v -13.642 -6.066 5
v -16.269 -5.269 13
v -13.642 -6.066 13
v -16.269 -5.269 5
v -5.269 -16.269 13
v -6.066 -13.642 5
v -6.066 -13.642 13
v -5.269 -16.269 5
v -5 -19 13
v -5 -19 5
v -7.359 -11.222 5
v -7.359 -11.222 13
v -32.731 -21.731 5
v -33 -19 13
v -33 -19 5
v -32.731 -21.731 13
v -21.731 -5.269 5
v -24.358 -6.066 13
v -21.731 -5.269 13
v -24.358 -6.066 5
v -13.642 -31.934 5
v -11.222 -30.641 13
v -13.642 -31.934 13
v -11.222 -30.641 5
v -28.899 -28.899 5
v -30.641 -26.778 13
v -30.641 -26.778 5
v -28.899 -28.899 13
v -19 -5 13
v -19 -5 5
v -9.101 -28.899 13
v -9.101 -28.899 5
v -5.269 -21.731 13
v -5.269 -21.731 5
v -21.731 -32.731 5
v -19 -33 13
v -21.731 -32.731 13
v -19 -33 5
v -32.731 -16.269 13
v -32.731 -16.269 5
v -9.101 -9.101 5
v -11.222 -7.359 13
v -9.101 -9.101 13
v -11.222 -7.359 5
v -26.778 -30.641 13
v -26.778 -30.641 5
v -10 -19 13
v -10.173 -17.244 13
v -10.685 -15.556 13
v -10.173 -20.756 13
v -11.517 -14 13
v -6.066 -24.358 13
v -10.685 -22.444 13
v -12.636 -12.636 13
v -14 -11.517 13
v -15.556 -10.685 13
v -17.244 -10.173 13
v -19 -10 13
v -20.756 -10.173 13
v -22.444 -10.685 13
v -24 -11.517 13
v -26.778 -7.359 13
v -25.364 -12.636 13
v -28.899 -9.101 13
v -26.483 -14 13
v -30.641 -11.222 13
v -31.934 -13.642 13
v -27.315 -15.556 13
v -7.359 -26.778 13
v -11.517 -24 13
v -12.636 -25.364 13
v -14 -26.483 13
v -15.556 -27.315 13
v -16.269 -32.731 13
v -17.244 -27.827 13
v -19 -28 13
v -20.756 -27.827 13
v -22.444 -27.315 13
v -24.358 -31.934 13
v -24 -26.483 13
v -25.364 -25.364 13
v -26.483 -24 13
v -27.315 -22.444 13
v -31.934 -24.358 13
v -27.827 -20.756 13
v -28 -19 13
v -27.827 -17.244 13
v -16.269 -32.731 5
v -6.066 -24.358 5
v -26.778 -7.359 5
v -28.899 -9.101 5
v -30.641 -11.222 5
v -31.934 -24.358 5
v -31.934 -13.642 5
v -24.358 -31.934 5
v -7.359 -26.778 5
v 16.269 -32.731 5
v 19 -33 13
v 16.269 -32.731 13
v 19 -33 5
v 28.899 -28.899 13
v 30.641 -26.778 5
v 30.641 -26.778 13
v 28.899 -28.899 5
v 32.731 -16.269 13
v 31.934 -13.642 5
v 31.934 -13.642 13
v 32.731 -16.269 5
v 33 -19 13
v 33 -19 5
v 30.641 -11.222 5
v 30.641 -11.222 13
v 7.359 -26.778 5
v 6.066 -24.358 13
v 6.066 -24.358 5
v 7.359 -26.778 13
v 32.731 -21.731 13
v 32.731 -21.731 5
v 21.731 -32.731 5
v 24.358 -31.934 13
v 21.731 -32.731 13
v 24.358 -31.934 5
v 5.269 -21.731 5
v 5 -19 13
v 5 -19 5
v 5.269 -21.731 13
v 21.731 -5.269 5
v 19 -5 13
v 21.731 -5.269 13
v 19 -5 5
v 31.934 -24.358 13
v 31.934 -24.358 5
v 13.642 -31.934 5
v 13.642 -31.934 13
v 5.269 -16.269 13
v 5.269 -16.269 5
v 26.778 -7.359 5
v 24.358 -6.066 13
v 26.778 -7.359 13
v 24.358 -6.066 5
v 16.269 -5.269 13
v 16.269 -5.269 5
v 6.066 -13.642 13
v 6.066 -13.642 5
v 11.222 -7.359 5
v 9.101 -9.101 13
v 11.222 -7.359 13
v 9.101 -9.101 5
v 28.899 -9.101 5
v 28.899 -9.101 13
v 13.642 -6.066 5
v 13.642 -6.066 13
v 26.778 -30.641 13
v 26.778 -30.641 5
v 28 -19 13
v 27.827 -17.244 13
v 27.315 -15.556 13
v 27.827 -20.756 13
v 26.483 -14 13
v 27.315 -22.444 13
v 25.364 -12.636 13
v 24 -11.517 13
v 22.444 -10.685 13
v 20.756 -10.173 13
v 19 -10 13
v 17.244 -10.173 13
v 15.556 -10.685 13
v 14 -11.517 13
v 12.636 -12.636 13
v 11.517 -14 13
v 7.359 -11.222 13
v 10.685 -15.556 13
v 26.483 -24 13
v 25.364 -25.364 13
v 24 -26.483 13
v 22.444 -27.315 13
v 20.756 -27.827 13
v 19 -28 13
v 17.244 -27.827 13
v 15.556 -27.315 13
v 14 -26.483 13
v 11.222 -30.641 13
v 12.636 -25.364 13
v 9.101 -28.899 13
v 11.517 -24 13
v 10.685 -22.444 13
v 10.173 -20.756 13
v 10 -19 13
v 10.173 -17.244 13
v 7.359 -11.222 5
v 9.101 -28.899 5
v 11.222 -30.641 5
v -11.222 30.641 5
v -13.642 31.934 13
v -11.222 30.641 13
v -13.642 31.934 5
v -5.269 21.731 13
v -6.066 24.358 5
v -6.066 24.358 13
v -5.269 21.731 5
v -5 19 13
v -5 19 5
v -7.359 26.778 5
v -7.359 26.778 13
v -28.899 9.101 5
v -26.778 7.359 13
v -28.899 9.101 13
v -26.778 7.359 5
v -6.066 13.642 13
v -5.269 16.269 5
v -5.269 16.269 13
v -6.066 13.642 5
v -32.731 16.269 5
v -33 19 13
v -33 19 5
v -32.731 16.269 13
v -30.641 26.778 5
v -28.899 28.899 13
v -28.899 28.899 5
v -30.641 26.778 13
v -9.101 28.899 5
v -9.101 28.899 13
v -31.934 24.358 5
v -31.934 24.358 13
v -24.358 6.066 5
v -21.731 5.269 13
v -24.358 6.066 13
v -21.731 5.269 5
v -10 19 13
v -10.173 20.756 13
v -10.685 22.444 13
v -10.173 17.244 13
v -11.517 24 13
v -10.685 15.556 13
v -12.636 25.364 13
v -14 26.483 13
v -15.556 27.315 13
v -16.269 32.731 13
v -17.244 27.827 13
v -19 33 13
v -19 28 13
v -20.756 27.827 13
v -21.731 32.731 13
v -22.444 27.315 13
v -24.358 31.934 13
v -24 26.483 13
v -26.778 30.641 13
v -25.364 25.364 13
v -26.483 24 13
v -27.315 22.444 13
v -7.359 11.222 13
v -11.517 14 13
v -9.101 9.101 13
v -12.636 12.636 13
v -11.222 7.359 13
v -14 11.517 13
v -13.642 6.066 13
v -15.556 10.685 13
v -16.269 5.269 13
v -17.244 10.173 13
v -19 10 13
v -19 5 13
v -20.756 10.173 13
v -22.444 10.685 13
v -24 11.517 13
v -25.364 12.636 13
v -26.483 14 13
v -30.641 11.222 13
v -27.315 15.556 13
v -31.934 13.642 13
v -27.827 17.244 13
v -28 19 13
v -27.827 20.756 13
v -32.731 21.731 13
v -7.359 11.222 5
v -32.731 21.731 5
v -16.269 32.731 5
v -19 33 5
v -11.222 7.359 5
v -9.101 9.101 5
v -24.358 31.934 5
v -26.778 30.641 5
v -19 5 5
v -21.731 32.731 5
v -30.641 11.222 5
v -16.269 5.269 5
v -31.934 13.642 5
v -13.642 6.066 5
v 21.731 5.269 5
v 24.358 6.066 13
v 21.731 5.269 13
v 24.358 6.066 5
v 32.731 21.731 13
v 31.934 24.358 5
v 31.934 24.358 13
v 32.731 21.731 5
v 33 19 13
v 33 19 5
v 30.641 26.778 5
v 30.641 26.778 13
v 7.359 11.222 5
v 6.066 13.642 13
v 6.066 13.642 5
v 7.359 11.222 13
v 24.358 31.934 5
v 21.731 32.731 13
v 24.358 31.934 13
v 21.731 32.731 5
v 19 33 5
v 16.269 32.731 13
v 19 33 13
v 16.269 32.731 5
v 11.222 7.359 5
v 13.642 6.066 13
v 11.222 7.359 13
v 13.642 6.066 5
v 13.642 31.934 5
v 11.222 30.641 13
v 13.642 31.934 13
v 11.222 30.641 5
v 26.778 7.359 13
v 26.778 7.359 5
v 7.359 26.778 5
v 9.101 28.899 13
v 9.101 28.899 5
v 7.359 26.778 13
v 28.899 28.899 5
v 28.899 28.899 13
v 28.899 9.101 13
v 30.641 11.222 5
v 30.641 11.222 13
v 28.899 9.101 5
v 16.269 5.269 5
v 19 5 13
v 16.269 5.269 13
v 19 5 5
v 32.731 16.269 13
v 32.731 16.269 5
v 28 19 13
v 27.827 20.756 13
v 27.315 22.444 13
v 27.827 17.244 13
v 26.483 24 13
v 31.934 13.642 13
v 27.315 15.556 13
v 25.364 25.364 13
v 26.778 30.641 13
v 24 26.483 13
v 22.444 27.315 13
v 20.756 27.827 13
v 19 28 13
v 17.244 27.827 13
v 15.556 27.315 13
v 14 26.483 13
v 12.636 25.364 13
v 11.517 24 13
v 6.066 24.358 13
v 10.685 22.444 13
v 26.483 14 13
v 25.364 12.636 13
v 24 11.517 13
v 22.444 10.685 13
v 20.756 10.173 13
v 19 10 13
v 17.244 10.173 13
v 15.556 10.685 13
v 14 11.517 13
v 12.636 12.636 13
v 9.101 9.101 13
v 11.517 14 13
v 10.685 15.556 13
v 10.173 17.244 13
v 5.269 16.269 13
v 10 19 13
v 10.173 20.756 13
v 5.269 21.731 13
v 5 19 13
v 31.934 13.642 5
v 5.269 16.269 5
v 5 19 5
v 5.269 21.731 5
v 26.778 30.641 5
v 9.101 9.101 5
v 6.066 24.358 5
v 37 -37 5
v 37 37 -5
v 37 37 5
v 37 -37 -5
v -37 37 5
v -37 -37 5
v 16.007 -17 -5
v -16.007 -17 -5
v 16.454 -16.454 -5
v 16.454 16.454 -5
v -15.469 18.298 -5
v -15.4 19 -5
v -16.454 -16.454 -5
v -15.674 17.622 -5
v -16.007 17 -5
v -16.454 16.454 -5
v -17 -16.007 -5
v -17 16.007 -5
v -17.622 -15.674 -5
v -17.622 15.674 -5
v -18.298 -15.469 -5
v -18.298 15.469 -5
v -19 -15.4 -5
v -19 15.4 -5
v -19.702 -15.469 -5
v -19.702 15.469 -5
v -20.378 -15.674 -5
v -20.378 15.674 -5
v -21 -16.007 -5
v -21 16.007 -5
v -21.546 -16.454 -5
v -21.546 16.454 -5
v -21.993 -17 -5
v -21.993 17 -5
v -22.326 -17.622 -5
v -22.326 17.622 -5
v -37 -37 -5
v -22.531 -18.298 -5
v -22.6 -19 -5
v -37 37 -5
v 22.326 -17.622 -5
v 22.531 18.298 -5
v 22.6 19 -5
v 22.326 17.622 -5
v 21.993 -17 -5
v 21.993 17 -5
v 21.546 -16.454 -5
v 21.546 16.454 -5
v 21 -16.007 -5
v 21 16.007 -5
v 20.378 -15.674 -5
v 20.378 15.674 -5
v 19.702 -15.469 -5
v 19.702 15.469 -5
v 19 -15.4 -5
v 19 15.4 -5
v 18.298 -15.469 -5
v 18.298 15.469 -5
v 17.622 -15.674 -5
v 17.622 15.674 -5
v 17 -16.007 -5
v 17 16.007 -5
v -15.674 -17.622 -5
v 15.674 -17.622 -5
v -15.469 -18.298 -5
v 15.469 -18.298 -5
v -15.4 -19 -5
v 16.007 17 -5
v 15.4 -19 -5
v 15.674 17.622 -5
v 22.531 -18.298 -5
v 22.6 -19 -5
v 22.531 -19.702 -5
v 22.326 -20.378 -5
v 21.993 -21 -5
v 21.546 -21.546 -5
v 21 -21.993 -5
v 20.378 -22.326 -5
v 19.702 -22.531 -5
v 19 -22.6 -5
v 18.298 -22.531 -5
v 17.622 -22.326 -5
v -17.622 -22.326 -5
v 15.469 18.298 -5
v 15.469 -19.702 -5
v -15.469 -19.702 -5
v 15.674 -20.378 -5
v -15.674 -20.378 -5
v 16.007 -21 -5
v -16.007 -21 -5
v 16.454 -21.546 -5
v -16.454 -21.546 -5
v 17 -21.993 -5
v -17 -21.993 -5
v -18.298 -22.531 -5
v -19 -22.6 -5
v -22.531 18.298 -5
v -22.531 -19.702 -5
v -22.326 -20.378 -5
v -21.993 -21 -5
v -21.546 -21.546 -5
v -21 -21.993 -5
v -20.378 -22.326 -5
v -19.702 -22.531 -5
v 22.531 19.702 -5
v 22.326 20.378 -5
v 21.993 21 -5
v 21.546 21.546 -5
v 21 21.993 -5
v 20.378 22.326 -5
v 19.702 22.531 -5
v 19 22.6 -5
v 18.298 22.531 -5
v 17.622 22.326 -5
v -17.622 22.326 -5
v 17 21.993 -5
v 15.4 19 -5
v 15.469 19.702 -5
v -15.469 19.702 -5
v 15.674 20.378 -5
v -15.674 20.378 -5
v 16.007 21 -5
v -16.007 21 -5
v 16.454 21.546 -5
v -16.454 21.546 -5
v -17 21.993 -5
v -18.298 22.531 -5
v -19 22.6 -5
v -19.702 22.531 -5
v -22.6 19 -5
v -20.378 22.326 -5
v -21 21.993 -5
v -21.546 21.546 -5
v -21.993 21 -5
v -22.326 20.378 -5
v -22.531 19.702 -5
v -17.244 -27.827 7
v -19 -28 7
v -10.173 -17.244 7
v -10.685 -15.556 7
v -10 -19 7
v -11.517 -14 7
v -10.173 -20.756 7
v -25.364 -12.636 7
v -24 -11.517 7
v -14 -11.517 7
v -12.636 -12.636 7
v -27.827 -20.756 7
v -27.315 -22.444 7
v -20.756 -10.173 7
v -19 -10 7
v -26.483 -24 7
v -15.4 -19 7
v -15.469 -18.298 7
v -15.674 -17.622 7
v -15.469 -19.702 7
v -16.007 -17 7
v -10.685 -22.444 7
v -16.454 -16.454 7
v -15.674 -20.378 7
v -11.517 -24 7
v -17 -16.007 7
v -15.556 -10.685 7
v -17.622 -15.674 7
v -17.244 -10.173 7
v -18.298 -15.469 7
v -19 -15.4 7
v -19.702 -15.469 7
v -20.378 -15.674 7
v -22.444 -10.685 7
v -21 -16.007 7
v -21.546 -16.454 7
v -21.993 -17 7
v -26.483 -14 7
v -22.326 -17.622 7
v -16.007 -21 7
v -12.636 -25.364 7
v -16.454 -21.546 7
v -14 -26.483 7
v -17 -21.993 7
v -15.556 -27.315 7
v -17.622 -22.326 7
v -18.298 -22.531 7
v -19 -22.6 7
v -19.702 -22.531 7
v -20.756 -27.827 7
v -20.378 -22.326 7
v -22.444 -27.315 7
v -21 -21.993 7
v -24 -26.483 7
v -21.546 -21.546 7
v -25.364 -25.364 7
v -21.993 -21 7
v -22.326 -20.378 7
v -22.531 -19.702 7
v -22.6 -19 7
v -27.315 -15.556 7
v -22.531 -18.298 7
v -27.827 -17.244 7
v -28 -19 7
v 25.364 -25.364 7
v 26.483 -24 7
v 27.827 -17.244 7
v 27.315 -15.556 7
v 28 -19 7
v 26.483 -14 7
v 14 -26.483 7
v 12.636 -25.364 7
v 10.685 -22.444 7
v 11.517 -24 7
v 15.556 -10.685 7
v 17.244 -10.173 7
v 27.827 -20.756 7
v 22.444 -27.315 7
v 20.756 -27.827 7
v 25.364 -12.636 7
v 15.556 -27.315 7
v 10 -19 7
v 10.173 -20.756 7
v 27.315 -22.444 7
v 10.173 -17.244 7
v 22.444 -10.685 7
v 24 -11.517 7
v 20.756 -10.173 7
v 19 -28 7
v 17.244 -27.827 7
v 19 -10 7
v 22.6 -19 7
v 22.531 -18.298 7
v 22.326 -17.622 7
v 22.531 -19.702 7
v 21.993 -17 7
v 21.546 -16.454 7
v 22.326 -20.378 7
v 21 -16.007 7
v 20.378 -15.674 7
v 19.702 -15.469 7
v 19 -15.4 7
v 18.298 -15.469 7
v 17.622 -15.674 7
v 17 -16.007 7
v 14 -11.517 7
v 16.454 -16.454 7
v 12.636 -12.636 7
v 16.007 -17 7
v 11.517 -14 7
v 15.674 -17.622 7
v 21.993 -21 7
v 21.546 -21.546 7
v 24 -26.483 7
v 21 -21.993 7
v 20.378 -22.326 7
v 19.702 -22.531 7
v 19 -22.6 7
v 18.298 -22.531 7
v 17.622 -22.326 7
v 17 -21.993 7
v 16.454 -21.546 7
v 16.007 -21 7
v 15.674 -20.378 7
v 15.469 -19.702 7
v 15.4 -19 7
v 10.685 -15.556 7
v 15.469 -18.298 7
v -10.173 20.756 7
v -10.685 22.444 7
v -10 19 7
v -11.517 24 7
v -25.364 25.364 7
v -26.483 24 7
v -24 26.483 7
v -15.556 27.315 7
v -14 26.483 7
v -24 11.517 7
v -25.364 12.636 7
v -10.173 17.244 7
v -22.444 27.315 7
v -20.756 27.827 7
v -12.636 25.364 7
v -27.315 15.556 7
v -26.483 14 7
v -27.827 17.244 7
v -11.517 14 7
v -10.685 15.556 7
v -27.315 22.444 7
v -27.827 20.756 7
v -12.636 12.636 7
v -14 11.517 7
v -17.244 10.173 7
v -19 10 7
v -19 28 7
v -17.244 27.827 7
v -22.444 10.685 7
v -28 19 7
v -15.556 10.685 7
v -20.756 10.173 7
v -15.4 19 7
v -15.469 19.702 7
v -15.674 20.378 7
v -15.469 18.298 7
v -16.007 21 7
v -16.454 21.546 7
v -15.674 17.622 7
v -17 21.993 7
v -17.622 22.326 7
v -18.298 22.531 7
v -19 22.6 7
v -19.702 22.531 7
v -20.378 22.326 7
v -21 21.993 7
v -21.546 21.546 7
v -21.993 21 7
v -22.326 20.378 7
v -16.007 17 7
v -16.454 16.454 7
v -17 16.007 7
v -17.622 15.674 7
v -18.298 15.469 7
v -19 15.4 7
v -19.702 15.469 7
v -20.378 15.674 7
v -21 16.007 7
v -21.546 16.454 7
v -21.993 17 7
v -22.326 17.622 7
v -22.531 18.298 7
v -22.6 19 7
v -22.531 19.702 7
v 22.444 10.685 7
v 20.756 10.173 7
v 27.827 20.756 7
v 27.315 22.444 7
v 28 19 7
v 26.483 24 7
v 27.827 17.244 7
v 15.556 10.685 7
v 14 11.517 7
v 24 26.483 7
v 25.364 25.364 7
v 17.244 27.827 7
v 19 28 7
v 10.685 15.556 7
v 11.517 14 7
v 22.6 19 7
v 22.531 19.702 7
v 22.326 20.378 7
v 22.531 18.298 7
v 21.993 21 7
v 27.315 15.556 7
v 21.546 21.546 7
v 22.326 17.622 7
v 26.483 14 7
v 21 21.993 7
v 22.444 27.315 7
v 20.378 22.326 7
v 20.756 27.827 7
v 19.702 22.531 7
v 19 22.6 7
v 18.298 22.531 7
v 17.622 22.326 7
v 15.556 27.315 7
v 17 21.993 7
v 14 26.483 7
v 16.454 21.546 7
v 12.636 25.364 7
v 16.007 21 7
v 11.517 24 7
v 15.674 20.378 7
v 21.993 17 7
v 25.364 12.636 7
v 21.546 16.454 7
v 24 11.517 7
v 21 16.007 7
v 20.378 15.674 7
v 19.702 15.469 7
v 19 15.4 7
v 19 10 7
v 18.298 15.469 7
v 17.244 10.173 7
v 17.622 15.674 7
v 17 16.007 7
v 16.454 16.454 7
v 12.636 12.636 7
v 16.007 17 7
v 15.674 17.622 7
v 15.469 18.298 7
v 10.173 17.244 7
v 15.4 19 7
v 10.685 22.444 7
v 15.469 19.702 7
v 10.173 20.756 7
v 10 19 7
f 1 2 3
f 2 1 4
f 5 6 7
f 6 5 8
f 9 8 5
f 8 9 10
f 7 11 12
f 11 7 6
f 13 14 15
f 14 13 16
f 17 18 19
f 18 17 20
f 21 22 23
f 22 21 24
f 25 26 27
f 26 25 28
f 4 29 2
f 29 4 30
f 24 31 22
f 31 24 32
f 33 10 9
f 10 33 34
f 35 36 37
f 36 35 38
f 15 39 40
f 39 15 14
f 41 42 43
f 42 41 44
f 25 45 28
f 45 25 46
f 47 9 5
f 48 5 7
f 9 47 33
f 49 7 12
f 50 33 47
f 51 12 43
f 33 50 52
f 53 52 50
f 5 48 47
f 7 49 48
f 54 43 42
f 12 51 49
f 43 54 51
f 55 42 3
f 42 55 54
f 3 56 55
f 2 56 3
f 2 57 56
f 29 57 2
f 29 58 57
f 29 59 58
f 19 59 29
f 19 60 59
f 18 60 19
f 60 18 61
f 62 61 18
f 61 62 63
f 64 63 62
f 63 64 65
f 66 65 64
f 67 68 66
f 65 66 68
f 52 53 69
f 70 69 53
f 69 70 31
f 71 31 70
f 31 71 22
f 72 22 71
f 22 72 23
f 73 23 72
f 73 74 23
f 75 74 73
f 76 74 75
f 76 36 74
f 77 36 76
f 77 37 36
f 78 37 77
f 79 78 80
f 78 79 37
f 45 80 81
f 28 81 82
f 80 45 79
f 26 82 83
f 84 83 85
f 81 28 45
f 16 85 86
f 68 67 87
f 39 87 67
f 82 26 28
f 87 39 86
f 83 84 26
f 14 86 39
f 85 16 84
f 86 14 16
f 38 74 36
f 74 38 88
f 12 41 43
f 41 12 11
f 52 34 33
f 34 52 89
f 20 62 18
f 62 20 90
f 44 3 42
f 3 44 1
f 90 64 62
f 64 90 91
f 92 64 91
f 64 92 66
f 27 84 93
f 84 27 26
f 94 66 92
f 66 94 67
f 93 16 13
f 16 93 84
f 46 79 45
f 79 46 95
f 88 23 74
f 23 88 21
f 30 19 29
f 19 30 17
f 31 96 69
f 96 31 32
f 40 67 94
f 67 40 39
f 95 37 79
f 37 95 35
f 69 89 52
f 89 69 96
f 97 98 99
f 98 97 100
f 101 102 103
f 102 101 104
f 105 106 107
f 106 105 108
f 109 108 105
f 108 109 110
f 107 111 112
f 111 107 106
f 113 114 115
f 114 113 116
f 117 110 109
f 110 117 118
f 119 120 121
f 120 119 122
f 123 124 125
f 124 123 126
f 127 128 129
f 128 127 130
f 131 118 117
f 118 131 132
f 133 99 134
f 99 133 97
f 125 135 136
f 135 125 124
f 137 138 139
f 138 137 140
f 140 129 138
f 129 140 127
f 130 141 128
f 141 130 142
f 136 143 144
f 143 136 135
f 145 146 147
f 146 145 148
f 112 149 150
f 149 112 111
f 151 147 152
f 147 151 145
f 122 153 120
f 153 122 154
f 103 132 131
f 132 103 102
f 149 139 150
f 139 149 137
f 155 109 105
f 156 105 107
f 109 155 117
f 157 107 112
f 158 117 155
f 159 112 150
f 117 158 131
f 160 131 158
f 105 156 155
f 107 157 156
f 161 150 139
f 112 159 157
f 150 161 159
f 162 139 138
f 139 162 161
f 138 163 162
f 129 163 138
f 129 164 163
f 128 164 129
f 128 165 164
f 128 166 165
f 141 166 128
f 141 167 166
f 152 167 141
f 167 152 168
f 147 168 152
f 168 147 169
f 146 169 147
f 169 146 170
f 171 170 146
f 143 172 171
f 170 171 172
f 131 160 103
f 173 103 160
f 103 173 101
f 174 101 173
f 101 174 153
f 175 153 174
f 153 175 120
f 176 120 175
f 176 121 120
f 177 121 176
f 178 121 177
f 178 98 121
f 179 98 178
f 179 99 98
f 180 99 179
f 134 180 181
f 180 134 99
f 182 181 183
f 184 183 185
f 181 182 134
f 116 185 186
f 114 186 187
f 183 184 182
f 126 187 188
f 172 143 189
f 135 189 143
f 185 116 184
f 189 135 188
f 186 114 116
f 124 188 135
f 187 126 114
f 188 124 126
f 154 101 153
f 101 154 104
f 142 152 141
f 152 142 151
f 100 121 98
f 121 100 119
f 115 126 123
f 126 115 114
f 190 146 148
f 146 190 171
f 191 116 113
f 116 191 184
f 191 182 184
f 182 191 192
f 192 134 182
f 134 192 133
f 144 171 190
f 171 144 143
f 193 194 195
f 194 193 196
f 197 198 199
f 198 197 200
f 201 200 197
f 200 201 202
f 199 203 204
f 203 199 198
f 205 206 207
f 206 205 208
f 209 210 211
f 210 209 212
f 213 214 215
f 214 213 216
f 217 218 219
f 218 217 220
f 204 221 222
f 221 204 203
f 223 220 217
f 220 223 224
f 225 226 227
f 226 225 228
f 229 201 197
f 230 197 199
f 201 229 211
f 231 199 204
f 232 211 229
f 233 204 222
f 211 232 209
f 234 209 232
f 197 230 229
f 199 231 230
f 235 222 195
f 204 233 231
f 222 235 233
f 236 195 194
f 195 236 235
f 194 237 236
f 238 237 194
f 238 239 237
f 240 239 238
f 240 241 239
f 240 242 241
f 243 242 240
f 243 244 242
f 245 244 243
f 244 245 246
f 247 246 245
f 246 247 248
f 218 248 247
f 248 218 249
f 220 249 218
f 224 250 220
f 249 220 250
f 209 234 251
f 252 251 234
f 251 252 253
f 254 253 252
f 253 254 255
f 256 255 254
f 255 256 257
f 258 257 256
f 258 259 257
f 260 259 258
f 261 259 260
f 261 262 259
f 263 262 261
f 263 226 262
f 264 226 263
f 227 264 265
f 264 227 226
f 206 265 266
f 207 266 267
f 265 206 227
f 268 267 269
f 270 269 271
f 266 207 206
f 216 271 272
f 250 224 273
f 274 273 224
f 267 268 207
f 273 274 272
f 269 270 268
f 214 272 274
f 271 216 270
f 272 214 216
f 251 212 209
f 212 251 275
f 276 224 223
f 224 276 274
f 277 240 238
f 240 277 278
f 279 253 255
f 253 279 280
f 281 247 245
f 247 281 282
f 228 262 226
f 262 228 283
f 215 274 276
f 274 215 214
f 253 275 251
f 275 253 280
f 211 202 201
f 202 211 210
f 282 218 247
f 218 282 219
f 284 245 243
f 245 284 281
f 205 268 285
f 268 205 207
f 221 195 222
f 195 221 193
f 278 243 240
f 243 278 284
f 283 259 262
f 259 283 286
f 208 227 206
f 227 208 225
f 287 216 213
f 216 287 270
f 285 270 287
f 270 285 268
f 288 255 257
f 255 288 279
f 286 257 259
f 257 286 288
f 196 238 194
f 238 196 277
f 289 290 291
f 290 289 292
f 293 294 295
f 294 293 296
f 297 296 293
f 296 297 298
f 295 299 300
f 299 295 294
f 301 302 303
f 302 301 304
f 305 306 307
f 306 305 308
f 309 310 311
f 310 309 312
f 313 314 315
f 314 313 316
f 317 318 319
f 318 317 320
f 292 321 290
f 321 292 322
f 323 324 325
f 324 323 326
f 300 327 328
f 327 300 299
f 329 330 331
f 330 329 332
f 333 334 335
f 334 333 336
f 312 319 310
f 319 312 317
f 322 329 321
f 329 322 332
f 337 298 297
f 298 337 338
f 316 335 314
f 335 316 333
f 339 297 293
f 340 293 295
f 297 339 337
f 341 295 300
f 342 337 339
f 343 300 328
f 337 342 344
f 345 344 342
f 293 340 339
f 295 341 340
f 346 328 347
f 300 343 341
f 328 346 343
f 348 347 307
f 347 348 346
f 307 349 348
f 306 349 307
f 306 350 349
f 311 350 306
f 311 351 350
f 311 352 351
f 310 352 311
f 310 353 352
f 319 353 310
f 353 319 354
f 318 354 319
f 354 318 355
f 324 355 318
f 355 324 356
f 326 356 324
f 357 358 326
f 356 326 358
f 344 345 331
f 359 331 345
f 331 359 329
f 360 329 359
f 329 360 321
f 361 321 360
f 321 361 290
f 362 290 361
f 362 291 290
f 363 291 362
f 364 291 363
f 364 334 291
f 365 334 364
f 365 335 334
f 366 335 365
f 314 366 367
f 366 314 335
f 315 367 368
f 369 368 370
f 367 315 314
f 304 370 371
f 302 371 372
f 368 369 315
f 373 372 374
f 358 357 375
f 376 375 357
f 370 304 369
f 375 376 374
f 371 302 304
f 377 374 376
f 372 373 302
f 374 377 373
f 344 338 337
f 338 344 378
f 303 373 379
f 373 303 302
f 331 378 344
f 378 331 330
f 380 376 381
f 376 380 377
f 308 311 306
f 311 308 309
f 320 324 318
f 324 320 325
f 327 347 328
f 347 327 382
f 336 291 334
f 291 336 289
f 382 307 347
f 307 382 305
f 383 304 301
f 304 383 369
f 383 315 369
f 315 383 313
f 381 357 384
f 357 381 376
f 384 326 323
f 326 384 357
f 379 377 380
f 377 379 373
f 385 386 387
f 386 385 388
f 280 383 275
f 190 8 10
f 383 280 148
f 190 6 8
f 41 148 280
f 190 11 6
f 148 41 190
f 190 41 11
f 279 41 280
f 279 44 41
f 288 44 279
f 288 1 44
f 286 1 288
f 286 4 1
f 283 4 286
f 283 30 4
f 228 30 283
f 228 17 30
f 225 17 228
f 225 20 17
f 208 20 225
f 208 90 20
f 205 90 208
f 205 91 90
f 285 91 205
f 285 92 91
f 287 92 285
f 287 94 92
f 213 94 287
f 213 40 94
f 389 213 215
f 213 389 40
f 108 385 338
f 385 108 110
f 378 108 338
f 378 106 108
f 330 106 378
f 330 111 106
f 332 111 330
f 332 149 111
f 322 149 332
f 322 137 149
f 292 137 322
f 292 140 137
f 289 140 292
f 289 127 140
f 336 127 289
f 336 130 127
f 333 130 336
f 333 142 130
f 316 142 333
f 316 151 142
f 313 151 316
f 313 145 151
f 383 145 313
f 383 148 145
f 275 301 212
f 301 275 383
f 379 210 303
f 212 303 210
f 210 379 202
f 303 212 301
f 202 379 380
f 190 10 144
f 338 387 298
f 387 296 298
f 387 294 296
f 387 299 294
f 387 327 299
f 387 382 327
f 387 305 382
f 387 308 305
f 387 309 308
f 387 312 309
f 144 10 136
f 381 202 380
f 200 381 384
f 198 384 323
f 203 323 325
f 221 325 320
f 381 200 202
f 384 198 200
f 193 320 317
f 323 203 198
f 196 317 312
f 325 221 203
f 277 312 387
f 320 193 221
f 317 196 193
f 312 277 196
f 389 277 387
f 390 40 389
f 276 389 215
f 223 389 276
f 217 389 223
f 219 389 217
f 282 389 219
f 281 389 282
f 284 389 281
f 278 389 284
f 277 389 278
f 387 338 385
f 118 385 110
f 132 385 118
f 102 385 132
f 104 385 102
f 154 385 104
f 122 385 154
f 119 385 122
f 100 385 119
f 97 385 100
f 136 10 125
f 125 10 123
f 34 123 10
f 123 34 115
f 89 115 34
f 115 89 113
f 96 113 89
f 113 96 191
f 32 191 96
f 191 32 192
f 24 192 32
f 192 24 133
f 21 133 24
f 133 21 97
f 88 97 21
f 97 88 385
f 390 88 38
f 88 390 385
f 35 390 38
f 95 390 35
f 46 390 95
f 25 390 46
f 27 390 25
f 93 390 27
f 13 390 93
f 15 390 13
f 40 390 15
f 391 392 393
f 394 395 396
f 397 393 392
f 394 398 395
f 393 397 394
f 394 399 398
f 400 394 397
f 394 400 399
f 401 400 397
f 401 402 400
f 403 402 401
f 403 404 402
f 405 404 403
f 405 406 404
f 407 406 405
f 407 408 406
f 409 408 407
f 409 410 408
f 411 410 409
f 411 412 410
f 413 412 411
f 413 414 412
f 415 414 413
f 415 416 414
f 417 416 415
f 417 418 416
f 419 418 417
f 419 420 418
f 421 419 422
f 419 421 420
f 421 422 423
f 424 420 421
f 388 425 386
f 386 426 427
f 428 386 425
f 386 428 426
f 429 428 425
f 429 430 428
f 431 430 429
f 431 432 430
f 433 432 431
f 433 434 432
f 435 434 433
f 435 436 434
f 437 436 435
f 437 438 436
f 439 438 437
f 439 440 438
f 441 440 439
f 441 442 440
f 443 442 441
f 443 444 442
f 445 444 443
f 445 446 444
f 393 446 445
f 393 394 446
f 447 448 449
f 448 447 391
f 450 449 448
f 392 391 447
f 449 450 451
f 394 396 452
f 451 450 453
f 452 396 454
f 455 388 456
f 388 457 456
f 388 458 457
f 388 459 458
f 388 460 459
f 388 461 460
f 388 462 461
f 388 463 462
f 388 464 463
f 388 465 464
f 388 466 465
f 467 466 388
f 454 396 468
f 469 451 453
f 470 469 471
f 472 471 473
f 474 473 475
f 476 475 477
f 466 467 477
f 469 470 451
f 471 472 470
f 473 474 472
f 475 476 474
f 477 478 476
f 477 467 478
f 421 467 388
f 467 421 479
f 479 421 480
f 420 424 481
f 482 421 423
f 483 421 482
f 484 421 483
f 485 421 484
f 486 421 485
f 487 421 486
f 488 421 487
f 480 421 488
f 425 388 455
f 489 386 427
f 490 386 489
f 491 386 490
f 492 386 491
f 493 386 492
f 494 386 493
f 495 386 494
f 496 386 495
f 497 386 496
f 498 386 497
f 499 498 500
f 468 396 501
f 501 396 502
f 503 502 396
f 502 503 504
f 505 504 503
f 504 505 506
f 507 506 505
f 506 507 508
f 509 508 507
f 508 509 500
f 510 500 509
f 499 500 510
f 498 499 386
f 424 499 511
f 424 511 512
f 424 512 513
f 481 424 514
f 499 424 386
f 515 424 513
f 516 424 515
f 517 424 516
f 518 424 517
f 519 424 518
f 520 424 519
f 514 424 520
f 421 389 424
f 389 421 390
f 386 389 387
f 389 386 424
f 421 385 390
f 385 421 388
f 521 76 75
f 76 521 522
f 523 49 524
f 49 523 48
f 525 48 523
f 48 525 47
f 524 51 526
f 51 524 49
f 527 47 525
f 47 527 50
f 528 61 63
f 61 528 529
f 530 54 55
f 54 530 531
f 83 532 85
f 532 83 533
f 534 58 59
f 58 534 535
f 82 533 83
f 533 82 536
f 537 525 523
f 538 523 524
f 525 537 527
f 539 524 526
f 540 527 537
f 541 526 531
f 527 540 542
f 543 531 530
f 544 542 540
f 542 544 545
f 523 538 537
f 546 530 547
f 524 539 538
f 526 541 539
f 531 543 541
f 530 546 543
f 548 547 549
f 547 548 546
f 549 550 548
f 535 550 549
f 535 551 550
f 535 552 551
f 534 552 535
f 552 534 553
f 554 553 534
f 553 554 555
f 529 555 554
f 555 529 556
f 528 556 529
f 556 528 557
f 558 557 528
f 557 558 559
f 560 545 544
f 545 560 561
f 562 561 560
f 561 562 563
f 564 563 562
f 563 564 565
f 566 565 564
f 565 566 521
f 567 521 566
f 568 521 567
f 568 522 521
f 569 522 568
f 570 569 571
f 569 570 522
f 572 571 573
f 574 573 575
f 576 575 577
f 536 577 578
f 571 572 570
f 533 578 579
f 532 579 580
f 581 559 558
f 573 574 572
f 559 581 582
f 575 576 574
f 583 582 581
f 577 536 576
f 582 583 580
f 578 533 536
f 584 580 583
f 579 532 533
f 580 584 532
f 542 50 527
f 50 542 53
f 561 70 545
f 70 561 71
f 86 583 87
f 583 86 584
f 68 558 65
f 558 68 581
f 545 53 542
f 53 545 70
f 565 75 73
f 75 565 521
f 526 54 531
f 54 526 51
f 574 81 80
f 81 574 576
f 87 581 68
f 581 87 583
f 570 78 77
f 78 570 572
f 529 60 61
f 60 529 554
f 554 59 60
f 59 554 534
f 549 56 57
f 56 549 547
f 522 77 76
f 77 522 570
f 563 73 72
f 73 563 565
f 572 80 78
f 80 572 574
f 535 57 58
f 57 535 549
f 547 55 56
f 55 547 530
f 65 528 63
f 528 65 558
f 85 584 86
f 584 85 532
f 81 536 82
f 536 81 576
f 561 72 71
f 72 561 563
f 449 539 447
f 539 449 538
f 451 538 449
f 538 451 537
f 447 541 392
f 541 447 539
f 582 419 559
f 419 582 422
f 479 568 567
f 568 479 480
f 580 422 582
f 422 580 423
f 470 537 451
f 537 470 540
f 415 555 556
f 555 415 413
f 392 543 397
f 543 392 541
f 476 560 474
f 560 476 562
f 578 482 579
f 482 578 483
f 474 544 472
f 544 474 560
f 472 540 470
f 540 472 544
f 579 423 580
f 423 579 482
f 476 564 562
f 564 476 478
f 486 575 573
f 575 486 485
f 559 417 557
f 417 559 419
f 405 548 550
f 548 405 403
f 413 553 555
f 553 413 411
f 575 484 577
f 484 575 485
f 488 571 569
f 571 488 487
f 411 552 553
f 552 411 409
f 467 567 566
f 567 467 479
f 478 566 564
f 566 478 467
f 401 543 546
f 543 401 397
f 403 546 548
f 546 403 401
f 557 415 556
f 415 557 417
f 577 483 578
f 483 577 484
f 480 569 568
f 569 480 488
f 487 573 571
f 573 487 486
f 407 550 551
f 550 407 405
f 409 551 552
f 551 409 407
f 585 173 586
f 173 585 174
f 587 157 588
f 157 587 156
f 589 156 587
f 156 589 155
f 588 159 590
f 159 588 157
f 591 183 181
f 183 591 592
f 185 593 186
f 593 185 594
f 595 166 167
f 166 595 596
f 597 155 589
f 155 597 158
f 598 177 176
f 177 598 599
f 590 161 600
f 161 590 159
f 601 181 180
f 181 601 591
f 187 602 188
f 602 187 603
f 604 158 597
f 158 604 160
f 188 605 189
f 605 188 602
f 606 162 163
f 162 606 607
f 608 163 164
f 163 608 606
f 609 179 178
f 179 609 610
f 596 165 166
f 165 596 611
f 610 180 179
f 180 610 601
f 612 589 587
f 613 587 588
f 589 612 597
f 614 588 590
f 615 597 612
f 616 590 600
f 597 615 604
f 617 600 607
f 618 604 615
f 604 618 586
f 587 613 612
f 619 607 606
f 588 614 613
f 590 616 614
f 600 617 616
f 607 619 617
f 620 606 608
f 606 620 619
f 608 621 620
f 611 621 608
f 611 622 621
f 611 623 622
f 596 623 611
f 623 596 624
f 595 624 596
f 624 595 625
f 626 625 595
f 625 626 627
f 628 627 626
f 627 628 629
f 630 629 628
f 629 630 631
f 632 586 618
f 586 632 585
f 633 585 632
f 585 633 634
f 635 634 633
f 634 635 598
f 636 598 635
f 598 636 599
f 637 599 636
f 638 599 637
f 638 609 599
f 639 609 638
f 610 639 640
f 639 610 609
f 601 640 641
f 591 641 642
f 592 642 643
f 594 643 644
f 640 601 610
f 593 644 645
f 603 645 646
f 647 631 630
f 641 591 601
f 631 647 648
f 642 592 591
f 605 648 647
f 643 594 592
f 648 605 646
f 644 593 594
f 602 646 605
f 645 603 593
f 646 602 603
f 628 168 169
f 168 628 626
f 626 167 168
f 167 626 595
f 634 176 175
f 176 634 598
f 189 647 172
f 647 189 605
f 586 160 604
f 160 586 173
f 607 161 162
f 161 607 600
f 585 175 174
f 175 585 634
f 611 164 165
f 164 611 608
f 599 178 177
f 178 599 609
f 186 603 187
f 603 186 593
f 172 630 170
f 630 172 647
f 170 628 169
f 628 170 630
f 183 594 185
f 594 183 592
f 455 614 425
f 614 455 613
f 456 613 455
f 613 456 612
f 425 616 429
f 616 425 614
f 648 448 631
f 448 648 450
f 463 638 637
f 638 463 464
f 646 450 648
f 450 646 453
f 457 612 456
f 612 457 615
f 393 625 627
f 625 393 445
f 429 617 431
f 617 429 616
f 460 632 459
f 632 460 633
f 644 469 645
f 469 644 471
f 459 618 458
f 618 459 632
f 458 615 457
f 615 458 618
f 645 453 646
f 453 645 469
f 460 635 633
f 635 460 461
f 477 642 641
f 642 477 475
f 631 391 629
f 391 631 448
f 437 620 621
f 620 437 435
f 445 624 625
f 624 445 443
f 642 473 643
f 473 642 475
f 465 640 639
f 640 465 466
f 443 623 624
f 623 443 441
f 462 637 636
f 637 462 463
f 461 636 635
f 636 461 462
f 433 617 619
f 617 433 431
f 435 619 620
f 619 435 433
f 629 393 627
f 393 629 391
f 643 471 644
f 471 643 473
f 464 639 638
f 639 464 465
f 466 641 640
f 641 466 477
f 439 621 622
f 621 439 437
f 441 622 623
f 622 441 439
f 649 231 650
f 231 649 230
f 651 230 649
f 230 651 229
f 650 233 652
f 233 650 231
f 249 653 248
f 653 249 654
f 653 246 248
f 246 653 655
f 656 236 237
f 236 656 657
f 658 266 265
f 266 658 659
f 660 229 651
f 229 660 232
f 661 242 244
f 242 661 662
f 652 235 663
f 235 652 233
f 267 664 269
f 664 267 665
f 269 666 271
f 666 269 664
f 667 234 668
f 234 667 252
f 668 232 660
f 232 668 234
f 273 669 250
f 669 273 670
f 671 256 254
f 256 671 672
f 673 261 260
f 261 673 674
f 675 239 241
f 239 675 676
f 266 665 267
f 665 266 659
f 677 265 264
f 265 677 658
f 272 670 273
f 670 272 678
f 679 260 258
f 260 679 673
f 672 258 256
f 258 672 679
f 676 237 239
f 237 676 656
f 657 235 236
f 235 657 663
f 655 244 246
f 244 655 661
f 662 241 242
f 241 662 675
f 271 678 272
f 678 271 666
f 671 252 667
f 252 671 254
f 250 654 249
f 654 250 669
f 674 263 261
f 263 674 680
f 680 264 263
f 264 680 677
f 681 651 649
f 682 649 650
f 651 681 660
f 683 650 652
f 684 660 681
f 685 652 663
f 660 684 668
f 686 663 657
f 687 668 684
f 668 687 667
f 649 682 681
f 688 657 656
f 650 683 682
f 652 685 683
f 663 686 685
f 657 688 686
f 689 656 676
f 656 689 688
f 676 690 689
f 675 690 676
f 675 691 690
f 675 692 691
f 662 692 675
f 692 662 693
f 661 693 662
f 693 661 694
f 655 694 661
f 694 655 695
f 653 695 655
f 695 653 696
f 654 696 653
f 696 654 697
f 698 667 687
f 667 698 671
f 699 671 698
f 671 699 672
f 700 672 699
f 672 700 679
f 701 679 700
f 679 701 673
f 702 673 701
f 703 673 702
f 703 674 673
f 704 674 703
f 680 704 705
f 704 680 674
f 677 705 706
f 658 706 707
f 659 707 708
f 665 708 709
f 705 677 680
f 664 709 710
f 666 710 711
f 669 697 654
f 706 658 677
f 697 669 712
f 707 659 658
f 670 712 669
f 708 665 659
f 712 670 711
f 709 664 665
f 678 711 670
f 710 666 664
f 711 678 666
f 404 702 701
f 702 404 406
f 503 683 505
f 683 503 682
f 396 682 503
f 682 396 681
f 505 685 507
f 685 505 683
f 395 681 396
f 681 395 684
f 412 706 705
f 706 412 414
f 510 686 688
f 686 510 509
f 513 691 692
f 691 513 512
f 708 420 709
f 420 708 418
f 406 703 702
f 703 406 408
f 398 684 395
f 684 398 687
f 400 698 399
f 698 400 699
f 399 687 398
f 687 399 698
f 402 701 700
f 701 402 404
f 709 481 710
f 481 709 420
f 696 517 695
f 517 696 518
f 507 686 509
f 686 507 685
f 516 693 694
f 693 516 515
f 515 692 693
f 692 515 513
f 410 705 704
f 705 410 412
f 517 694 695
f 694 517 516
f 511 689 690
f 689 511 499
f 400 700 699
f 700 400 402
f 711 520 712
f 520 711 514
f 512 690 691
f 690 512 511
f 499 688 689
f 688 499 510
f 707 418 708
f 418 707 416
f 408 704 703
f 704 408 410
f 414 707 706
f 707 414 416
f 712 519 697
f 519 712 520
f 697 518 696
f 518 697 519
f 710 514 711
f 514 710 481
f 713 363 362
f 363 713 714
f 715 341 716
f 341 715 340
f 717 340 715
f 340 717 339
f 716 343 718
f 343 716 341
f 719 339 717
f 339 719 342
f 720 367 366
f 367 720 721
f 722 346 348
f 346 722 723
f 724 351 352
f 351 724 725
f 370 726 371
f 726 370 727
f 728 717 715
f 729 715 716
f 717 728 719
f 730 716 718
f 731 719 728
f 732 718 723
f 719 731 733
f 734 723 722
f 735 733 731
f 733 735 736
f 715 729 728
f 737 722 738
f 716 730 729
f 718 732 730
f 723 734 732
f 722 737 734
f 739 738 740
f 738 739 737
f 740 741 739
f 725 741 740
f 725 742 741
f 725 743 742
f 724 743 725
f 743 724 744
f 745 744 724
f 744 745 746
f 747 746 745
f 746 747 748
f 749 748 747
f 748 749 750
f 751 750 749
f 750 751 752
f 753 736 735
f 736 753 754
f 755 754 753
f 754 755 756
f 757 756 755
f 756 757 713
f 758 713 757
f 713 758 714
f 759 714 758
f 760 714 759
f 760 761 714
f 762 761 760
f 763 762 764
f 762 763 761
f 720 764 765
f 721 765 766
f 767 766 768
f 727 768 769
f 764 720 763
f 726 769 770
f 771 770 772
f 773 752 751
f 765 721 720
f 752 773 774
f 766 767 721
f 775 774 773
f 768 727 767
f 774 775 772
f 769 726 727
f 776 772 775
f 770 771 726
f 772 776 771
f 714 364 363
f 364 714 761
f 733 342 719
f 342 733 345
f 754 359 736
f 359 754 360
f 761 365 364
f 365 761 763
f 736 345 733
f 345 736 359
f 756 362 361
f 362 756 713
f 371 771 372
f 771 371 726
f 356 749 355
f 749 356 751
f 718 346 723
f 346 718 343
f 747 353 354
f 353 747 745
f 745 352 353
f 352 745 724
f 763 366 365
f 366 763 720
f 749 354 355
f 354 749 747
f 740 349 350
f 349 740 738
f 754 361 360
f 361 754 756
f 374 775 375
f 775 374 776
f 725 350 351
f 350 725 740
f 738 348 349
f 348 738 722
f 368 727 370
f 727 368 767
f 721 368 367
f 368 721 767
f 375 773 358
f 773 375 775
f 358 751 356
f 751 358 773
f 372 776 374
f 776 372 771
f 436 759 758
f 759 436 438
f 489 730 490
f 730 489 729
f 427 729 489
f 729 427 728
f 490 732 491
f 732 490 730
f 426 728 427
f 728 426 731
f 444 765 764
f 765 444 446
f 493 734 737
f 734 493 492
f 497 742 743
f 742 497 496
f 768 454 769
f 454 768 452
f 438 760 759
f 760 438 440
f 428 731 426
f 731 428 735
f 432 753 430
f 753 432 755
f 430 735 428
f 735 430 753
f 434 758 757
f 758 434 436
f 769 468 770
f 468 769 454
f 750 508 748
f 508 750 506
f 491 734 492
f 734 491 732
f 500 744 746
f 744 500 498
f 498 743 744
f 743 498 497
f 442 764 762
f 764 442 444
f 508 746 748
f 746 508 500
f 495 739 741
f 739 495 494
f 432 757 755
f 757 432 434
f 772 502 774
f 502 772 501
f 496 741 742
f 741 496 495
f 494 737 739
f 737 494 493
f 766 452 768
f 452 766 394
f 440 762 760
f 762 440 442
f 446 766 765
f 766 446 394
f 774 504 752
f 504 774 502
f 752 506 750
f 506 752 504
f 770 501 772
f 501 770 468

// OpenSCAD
$fn = 32;

// ----------------------------------------------------------------------
// Socket pad plate
// bosses with counterbored sockets for the screws
// ----------------------------------------------------------------------

// --- parameters (mm) ---
base_t = 10;       // base plate thickness
boss_h = 8;        // boss height above the base plate
boss_d = 28;       // boss diameter
socket_d = 18;     // socket diameter
socket_depth = 6;  // socket depth from the boss face
bolt_d = 7.2;      // screw clearance hole through the socket floor
rows = 2;          // boss rows
cols = 2;          // bosses per row
pitch = 38;        // boss pitch

// --- derived feature positions (mm) ---
height = base_t + boss_h;           // = 18   overall height of the part
plate = [pitch * (cols - 1) + boss_d + 8, pitch * (rows - 1) + boss_d + 8, base_t];  // = [74, 74, 10]   overall size (x, y, z)
span_x = pitch * (cols - 1);        // = 38   distance between outer bosses
span_y = pitch * (rows - 1);        // = 38   distance between boss rows
origin_x = -span_x / 2;             // = -19   X of the first boss
origin_y = -span_y / 2;             // = -19   Y of the first boss
feature_centers = [
  [origin_x + 0 * pitch, origin_y + 0 * pitch],
  [origin_x + 1 * pitch, origin_y + 0 * pitch],
  [origin_x + 0 * pitch, origin_y + 1 * pitch],
  [origin_x + 1 * pitch, origin_y + 1 * pitch]
];   // boss centres: sockets, holes and the pads themselves are placed from here

// base plate, bosses on feature_centers, socket + through hole in each
difference() {
  union() {
    cube(plate, center = true);
    for (centre = feature_centers)
      translate([centre[0], centre[1], plate[2] / 2 - 1])
        cylinder(d = boss_d, h = boss_h + 1);
  }
  for (centre = feature_centers) {
    translate([centre[0], centre[1], plate[2] / 2 + boss_h - socket_depth])
      cylinder(d = socket_d, h = socket_depth + 1);
    translate([centre[0], centre[1], -height])
      cylinder(d = bolt_d, h = 2 * height + 2);  // through the socket floor
  }
}
